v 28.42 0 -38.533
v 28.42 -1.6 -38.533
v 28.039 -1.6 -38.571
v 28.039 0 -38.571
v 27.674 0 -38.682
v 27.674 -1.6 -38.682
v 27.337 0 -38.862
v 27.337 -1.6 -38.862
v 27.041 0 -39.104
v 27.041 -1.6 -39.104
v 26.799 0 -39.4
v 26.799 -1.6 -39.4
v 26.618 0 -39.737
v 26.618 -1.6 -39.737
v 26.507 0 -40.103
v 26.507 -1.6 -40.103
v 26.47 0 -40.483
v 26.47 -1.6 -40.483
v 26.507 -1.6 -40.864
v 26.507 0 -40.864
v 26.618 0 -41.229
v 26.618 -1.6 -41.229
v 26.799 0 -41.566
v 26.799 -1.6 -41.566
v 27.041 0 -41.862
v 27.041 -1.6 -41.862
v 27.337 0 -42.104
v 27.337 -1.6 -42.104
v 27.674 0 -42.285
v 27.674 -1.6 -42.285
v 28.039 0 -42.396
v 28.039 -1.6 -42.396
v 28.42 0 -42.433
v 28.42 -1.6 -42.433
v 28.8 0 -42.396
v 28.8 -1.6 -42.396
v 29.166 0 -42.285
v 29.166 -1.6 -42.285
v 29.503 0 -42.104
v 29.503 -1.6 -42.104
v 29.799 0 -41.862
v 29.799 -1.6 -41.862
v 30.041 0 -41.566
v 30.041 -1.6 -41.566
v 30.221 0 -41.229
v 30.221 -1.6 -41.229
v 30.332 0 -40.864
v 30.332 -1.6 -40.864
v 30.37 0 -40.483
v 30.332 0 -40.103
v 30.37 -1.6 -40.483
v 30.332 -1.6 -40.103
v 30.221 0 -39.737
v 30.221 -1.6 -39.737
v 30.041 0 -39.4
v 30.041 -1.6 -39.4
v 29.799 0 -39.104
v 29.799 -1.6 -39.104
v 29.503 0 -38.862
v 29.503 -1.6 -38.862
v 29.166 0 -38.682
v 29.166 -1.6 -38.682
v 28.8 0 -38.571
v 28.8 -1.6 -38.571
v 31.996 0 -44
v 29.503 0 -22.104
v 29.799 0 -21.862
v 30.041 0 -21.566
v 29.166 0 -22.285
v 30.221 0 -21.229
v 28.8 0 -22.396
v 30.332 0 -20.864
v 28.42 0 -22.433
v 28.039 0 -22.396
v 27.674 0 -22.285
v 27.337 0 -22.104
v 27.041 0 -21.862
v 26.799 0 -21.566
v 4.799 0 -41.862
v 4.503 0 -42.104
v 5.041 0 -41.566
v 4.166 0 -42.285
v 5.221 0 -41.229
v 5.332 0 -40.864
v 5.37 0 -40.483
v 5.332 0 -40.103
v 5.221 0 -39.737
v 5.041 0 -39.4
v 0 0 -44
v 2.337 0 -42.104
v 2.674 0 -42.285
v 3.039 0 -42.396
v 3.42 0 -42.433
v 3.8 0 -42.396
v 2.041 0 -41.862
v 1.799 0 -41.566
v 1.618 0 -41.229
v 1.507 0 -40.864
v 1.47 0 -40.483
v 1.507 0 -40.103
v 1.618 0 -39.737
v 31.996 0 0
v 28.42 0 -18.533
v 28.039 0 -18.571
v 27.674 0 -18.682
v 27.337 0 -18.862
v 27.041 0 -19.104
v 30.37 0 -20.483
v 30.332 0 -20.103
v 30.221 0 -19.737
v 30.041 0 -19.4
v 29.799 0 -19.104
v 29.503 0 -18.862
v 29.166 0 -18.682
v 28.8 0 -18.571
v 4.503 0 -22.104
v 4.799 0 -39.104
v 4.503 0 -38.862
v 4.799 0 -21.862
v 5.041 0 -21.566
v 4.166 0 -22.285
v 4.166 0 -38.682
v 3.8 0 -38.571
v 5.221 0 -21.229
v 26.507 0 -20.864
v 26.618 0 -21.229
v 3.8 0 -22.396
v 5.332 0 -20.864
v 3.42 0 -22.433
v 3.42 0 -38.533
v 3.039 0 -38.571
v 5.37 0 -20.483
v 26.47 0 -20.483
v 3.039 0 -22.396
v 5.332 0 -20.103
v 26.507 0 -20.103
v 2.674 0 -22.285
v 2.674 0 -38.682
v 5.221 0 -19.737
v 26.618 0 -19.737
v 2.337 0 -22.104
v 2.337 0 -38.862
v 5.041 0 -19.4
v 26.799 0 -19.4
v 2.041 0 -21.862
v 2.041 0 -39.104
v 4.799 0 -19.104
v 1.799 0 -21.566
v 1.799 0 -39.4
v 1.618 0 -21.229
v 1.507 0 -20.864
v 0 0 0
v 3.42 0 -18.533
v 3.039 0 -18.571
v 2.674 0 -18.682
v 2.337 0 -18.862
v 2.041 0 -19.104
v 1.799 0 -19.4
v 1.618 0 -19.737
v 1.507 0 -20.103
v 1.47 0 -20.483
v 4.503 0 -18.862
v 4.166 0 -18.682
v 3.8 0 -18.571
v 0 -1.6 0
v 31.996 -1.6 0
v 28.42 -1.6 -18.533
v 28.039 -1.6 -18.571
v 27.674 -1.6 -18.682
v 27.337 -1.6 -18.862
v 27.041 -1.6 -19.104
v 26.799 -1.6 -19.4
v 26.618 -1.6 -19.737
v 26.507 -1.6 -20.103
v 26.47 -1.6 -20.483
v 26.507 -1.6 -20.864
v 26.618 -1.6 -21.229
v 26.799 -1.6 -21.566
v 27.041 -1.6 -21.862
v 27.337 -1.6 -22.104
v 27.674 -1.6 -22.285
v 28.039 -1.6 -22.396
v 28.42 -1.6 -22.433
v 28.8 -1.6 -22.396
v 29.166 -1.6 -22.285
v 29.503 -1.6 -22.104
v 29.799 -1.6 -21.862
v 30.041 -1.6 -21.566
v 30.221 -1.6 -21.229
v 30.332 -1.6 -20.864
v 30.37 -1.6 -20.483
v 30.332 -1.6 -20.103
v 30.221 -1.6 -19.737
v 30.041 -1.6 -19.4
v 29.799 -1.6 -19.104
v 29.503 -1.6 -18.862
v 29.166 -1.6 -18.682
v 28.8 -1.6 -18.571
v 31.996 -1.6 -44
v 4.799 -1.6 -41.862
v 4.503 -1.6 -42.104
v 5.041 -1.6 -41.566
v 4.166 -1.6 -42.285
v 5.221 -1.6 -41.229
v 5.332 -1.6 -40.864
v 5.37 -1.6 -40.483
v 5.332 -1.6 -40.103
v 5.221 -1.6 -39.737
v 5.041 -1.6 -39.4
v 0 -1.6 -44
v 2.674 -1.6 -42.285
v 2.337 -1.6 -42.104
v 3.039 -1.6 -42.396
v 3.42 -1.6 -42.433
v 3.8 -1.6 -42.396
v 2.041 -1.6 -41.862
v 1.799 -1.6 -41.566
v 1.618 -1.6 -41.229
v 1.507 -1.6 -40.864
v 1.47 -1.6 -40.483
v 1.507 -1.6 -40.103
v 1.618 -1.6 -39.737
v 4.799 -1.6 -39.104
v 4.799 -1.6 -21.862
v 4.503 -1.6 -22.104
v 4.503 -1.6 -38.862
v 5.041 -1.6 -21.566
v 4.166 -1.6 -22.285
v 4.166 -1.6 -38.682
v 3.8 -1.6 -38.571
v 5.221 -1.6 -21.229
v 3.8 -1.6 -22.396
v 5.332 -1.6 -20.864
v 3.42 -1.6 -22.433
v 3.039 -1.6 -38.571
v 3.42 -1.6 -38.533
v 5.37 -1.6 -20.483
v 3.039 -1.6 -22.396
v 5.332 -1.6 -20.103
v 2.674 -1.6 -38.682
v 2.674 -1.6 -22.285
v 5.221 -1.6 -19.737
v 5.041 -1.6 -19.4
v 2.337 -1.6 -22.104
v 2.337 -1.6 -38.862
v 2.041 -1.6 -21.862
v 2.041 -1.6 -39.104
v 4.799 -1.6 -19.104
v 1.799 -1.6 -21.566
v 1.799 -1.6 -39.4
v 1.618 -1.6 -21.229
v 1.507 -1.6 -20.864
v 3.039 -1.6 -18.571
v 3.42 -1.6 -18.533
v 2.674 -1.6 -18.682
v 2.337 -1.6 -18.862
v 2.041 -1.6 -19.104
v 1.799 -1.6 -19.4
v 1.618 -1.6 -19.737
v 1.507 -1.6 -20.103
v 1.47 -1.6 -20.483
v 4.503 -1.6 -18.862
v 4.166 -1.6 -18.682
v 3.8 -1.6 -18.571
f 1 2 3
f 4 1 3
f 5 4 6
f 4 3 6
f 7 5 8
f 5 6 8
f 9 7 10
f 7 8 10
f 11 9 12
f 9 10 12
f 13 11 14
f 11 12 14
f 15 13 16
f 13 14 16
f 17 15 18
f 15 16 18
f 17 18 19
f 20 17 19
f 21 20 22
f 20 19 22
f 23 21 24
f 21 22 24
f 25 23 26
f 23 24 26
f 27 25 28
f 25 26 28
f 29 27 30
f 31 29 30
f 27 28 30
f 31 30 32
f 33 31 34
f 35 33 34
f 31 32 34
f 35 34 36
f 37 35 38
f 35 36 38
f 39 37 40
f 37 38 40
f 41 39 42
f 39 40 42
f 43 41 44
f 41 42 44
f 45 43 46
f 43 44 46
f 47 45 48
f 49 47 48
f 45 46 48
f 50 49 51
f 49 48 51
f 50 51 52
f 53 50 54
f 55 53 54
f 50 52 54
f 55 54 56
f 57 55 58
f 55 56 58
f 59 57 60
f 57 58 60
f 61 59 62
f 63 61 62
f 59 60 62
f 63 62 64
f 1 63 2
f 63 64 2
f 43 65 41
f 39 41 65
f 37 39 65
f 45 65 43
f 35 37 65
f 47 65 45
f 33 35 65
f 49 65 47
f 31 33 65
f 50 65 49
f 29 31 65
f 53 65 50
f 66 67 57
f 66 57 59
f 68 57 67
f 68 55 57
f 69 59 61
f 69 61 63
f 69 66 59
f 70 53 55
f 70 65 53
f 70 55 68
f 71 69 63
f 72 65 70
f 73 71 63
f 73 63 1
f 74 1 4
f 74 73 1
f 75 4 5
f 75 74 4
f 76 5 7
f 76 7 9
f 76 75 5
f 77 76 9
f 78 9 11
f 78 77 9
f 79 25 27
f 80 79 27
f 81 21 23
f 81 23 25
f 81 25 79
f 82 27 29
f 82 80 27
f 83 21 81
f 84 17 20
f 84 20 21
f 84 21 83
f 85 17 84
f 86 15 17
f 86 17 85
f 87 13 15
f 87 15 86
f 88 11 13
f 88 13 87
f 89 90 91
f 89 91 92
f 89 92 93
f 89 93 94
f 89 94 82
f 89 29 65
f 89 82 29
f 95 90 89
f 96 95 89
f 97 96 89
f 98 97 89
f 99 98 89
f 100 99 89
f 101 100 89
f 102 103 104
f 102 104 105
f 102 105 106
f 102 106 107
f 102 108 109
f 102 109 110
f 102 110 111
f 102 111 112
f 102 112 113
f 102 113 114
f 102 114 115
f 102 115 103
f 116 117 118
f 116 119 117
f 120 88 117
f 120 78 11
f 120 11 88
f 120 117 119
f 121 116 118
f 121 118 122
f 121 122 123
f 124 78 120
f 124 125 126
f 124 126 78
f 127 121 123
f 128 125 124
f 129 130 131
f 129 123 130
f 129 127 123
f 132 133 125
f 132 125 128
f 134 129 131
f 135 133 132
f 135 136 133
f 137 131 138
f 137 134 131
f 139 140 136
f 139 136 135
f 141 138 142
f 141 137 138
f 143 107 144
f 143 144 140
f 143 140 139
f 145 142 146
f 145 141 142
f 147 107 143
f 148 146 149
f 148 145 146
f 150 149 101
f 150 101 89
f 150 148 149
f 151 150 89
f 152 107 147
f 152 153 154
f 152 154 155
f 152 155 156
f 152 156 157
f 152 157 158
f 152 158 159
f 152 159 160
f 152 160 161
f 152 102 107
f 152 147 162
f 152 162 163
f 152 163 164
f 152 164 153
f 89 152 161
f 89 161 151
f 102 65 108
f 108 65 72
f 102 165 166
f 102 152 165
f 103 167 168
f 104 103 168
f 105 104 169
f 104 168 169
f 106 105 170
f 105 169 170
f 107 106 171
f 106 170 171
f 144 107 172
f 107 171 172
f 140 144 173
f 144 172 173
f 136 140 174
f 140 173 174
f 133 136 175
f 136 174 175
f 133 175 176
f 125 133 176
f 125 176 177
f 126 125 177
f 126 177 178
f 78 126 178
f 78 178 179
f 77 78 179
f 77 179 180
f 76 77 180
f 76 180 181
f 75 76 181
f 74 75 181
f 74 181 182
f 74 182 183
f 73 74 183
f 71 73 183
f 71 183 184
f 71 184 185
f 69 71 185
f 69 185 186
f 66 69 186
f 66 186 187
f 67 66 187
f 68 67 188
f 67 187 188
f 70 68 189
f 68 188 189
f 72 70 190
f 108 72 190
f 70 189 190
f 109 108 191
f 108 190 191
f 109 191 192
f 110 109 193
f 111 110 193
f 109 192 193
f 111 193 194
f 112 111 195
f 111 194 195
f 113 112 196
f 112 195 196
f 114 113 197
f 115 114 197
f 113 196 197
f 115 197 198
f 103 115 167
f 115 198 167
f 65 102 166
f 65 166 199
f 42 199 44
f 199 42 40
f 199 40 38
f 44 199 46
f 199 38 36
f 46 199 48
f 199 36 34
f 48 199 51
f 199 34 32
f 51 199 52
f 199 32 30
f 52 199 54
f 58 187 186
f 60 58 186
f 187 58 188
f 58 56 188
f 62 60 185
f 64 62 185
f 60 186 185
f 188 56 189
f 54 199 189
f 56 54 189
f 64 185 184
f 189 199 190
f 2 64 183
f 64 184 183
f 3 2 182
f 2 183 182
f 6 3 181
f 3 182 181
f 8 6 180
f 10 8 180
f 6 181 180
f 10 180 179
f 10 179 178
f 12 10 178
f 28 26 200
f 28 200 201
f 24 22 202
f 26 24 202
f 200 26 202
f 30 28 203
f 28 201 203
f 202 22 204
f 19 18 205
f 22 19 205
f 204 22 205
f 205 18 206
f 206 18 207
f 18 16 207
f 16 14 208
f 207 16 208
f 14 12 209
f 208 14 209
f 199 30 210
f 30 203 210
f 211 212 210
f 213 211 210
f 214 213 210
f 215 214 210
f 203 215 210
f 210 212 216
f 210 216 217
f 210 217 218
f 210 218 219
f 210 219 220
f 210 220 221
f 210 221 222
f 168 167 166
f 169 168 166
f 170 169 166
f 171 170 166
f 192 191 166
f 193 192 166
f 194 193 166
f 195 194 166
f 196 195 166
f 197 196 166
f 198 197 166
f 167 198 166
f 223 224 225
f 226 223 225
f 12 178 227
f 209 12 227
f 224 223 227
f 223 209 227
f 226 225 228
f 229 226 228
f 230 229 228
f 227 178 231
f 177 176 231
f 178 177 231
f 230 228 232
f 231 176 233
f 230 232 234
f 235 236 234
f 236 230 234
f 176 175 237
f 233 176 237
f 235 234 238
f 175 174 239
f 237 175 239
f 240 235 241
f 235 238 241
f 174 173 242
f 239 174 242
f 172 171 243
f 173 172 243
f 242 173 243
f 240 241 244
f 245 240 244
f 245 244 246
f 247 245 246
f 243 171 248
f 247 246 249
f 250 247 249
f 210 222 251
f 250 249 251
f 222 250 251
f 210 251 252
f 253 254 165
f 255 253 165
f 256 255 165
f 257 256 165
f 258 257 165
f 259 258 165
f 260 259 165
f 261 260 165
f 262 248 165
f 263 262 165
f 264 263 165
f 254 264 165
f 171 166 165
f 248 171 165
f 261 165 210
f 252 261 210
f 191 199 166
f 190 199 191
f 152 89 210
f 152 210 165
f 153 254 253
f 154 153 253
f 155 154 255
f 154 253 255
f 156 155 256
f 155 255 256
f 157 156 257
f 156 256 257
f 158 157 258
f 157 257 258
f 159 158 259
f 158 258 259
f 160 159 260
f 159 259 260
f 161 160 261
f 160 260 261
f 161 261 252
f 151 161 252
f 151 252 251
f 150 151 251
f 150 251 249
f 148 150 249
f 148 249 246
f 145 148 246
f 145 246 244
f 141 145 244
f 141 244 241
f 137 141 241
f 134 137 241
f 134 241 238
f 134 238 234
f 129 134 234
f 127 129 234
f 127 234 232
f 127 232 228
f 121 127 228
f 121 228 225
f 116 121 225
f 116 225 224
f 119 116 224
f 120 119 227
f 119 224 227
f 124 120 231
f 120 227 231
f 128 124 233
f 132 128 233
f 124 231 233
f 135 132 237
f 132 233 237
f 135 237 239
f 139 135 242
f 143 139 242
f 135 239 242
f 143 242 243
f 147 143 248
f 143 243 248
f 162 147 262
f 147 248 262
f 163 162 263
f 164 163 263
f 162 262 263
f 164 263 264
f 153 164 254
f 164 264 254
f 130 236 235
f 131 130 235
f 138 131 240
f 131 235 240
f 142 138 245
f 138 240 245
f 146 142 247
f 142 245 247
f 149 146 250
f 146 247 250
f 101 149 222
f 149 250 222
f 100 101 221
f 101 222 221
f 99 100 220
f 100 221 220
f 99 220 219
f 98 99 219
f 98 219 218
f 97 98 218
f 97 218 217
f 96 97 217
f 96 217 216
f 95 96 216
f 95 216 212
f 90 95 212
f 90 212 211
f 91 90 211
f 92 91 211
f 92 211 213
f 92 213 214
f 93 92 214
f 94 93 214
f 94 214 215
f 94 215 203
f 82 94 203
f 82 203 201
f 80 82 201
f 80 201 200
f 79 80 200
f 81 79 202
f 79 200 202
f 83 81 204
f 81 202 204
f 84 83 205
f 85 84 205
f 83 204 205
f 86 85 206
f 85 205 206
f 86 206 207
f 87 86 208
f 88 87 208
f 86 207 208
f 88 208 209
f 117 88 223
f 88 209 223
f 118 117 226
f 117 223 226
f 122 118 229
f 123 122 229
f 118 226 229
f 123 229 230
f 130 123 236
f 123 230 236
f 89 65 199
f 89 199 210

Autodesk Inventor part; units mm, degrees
ref_plane "YZ Plane" through (0, 0, 0) normal (1, 0, 0) x (0, 1, 0)
ref_plane "XZ Plane" through (0, 0, 0) normal (0, 1, 0) x (-1, 0, 0)
ref_plane "XY Plane" through (0, 0, 0) normal (0, 0, 1) x (1, 0, 0)
sketch "Sketch1" plane through (0, 0, 0) normal (0, 1, 0) x (-1, 0, 0)
  line L0 (0, 0) -> (0, -44) construction
  line L1 (0, -44) -> (-31.9955, -44) construction
  line L2 (-31.9955, -44) -> (-31.9955, 0) construction
  line L3 (-31.9955, 0) -> (0, 0) construction
  dimension "d5" = 44
  dimension "d9" = 31.9955
sketch "Sketch2" plane through (0, 0, 0) normal (0, 1, 0) x (-1, 0, 0)
  line L0 (0, 0) -> (0, -44) construction
  line L1 (0, -44) -> (-31.9955, -44) construction
  line L2 (-31.9955, -44) -> (-31.9955, 0) construction
  line L3 (-31.9955, 0) -> (0, 0) construction
  line L4 (0, 0) -> (-31.9955, 0)
  line L5 (-31.9955, 0) -> (-31.9955, -44)
  line L6 (-31.9955, -44) -> (0, -44)
  line L7 (0, -44) -> (0, 0)
extrude "Extrusion1" add sketch "Sketch2" against normal blind 1.6
decal "Decal1"
sketch "Sketch4" plane through (0, 0, 0) normal (0, 1, 0) x (1, 0, 0)
  line L0 (3.4199, 20.4831) -> (28.4199, 20.4831)
  line L1 (28.4199, 20.4831) -> (28.4199, 40.4831)
  line L2 (28.4199, 40.4831) -> (3.4199, 40.4831)
  line L3 (3.4199, 40.4831) -> (3.4199, 20.4831)
  line L4 (3.4199, 20.4831) -> (28.4199, 40.4831) construction
  line L5 (28.4199, 20.4831) -> (3.4199, 40.4831) construction
  point P0 (0, 0)
  point P1 (15.9199, 30.4831)
  dimension "d14" = 25
  dimension "d15" = 20
hole "Hole1" at (3.4199, 0, -40.4831) at (3.4199, 0, -20.4831) at (28.4199, 0, -20.4831) at (28.4199, 0, -40.4831) direction (0, -1, 0) diameter 3.9 depth 3
properties part number "DFR-08104"
